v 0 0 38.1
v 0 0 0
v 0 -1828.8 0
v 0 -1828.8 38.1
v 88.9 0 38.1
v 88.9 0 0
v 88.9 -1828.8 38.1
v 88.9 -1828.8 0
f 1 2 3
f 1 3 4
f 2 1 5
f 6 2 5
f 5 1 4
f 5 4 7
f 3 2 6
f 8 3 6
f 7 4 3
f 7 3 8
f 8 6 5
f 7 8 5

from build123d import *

# Parameters (mm, degrees)
F0_W     = 88.9
F0_H     = 38.1
F1_DEPTH = 1828.8


with BuildPart() as f1:
    # F0 (on Front) → F1 (new body)
    with BuildSketch(Plane.XZ):
        with Locations((44.45, 19.05)):
            Rectangle(F0_W, F0_H)
    extrude(amount=F1_DEPTH)


with BuildPart() as f2_1:
    # F2: copy of F1
    add(f1.part.moved(Location((203.2, 0, 0))))


solid = f1.part
